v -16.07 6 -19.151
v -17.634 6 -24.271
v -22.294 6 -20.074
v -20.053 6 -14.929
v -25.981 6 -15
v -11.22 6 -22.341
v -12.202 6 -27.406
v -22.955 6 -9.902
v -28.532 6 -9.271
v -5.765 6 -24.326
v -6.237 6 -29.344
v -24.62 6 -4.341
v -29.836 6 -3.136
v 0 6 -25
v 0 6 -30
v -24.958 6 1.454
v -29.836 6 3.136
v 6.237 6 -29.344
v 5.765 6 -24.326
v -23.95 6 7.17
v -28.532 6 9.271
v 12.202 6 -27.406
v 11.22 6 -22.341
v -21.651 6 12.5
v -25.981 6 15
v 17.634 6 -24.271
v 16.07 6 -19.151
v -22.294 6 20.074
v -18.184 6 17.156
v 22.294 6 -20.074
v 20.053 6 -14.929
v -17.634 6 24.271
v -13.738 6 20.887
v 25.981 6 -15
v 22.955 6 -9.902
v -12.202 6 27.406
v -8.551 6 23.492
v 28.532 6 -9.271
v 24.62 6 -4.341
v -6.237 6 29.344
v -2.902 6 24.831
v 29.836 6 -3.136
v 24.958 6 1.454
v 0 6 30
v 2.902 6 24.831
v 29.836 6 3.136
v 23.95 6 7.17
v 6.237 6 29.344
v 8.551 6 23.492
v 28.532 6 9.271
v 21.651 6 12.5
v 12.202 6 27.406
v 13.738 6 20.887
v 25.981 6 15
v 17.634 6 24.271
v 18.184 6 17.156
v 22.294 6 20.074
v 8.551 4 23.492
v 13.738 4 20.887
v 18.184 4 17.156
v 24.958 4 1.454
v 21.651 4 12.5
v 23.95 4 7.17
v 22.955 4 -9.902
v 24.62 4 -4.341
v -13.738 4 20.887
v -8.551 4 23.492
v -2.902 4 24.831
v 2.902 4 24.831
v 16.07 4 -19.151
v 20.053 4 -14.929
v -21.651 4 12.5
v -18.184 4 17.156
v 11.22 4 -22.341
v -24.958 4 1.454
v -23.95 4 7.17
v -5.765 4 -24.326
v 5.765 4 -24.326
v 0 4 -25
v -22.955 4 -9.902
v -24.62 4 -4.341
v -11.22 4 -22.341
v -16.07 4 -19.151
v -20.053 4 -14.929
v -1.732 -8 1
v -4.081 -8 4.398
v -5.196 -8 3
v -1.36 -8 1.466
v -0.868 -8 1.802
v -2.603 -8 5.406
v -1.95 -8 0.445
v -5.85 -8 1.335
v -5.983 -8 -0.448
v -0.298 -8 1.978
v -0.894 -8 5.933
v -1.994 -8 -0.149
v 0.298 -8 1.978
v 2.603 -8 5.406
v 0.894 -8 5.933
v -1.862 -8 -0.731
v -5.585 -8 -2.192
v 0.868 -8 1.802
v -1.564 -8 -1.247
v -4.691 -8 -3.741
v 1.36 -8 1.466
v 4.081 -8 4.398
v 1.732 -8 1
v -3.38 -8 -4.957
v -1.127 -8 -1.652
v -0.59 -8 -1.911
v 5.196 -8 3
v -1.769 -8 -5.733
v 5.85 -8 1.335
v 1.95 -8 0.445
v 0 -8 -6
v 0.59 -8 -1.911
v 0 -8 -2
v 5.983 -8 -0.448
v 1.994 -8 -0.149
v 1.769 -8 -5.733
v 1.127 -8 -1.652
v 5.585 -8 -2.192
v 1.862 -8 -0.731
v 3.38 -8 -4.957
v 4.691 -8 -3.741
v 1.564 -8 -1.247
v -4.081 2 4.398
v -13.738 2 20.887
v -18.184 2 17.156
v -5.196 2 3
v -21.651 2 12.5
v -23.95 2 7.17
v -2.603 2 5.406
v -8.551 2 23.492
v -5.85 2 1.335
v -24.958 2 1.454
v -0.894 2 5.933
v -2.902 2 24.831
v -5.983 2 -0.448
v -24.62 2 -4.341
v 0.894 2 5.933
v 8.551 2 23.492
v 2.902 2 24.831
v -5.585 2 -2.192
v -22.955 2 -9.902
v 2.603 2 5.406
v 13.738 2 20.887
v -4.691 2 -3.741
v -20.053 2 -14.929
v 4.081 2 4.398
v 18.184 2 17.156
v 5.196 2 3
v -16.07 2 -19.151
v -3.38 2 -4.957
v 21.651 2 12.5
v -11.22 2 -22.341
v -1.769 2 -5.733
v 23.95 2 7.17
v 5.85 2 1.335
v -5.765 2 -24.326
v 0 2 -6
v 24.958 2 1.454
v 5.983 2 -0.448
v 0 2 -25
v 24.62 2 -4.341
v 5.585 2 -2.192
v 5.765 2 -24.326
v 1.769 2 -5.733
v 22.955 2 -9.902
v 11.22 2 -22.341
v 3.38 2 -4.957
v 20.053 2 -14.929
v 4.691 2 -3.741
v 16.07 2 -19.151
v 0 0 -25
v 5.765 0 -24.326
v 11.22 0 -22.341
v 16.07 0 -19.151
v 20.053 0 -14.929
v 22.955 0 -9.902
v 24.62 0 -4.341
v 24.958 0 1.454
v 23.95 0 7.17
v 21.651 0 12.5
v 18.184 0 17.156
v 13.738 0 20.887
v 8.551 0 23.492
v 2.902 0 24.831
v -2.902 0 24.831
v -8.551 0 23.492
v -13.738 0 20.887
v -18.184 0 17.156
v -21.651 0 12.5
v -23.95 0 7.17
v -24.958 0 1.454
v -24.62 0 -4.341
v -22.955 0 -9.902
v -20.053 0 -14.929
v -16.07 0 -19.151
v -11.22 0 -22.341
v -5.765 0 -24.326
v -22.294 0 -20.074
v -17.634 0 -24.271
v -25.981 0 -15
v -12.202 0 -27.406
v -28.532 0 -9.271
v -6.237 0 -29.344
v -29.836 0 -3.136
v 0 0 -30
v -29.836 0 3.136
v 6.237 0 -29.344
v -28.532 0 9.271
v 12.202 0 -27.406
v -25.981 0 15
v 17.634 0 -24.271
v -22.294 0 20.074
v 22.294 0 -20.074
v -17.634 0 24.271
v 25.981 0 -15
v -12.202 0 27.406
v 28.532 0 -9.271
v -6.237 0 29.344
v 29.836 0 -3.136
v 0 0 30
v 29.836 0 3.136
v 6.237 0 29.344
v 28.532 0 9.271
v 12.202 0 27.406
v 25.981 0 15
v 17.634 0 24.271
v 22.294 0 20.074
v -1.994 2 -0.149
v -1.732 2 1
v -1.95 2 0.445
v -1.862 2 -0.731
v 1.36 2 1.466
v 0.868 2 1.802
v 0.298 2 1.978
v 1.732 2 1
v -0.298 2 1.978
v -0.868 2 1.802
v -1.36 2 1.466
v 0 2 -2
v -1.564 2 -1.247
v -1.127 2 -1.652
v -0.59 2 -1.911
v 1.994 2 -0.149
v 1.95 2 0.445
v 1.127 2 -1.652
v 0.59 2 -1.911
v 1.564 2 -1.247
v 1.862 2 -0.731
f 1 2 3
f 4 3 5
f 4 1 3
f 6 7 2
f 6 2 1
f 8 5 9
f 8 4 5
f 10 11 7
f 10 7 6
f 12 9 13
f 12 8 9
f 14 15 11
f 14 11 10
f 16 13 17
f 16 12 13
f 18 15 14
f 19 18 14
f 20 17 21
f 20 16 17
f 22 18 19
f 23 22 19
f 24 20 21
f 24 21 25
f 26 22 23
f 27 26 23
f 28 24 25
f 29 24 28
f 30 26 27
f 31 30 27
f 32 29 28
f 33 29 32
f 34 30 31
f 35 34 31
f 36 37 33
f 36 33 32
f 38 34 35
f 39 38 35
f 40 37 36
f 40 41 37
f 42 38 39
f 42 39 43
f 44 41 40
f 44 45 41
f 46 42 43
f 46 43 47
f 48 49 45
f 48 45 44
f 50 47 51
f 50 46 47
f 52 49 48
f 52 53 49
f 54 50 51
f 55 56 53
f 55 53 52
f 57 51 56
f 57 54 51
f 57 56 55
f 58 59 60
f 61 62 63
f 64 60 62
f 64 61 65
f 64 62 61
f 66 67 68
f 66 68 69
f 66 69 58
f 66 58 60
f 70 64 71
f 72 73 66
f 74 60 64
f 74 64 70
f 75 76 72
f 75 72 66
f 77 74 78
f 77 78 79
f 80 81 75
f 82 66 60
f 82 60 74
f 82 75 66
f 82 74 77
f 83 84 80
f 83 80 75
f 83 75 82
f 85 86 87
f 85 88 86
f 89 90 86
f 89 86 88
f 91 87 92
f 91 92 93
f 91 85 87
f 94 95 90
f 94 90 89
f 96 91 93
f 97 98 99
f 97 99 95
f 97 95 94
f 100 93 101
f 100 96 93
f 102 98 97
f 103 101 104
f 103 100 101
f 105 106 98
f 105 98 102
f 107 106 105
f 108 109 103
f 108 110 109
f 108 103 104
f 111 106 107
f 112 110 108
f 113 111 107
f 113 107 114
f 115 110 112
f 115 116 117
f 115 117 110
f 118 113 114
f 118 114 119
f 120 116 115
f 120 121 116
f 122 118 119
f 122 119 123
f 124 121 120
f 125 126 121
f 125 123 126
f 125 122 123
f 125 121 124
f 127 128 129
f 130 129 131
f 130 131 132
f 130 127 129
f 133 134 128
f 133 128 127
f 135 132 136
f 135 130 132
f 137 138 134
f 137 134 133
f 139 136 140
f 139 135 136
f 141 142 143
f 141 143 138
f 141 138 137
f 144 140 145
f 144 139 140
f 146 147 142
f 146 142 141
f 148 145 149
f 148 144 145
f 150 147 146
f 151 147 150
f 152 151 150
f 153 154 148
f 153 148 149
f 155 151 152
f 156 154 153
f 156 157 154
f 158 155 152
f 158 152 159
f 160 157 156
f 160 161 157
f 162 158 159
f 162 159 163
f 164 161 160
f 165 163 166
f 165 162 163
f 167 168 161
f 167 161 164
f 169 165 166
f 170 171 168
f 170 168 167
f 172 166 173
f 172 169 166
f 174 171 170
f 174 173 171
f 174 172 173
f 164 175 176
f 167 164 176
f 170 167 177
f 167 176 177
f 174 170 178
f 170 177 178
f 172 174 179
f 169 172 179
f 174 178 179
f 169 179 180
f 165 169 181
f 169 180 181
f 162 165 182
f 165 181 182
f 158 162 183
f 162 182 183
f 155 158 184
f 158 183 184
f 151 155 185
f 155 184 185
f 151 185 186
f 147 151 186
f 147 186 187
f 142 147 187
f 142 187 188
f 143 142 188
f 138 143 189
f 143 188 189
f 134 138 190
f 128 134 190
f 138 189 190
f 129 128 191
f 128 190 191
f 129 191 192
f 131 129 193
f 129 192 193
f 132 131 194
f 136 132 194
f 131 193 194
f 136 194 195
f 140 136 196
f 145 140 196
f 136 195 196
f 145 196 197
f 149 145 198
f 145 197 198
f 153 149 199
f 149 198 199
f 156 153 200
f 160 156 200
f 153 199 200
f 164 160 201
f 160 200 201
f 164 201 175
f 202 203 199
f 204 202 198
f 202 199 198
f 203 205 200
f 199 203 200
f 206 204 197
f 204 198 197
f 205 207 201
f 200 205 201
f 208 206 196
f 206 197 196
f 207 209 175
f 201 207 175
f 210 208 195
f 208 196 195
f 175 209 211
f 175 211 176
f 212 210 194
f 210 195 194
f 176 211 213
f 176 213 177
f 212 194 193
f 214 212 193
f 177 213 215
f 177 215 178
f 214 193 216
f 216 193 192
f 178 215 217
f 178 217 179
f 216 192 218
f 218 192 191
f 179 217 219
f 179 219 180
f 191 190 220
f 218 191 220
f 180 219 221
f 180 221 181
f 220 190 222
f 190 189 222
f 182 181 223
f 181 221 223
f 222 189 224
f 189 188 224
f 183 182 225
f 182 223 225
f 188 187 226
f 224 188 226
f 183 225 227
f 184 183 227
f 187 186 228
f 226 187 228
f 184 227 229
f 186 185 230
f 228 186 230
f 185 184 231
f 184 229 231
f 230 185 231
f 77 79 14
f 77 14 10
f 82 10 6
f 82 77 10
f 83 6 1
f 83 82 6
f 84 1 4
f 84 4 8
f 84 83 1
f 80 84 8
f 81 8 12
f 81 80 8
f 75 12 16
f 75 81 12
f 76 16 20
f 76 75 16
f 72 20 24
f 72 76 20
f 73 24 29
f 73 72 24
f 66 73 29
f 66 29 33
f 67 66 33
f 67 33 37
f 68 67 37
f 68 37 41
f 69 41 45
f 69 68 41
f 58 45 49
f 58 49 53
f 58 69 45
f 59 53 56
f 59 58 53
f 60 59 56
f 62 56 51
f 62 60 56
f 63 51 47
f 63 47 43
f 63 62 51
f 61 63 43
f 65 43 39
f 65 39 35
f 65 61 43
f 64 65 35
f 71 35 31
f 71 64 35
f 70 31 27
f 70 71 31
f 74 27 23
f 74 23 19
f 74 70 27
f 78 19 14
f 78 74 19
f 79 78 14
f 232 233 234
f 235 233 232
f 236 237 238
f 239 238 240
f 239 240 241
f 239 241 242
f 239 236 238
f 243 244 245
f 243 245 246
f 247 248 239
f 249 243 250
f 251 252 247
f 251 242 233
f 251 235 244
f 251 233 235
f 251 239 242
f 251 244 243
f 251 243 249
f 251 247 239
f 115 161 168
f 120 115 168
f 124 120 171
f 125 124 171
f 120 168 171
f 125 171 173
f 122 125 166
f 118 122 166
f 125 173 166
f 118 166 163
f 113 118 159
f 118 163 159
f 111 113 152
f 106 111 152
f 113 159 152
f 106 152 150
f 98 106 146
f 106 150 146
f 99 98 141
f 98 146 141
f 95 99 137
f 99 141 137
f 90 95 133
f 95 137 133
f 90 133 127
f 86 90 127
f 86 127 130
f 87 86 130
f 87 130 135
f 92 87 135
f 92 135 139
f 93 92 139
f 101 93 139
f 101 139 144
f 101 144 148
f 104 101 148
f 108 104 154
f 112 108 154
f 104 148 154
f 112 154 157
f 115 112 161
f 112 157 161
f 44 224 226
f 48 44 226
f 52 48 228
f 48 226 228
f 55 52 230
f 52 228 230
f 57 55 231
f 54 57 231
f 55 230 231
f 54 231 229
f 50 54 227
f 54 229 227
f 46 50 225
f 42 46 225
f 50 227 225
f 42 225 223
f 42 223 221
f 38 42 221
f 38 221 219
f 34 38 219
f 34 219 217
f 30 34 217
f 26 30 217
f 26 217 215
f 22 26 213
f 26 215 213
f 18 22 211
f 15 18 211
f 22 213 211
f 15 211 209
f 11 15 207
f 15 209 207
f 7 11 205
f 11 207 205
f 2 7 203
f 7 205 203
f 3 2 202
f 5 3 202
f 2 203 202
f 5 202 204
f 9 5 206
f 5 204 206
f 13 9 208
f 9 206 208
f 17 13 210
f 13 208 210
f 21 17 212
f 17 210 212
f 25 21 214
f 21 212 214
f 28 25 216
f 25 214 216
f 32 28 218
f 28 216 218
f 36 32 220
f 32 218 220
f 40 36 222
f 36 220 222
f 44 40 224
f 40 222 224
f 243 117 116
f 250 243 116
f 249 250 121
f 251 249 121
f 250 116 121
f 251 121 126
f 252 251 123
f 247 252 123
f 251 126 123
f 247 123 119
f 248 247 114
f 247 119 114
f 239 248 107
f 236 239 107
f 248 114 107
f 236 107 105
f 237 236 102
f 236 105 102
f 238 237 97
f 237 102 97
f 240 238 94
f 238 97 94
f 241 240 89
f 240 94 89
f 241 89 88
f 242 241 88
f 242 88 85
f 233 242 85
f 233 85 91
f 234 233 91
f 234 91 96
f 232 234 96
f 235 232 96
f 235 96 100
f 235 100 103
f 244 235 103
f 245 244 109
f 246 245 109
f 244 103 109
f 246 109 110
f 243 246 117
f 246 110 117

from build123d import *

# Parameters (mm, degrees)
SKETCH_1_R          = 30
EXTRUDE_3_DEPTH     = 6
SKETCH_6_R          = 25
CUT_EXTRUDE_1_DEPTH = 2
CUT_EXTRUDE_START   = 4
SKETCH_4_R          = 25
CUT_EXTRUDE_2_DEPTH = 2
SKETCH_8_R          = 6
EXTRUDE_5_DEPTH     = 10
SKETCH_10_R         = 2
CUT_EXTRUDE_6_DEPTH = 10


with BuildPart() as part:
    # 草图1 → 凸台-拉伸3 (new body)
    with BuildSketch(Plane(origin=(0, 0, 0), x_dir=(1, 0, 0), z_dir=(0, 1, 0))):
        with Locations(Location((0, 0, 0), (0, 0, 270))):
            Circle(SKETCH_1_R)
    extrude(amount=EXTRUDE_3_DEPTH)

    # 草图6 → 切除-拉伸1 (cut)
    with BuildSketch(Plane.XZ):
        with Locations(Location((0, 0, 0), (0, 0, 270))):
            Circle(SKETCH_6_R)
    extrude(amount=-CUT_EXTRUDE_1_DEPTH, mode=Mode.SUBTRACT)

    # 草图4 → 切除-拉伸2 (cut)
    with BuildSketch(Plane(origin=(0, 0, 0), x_dir=(1, 0, 0), z_dir=(0, 1, 0)).offset(CUT_EXTRUDE_START)):
        with Locations(Location((0, 0, 0), (0, 0, 90))):
            Circle(SKETCH_4_R)
    extrude(amount=CUT_EXTRUDE_2_DEPTH, mode=Mode.SUBTRACT)

    # 草图8 → 凸台-拉伸5 (add)
    with BuildSketch(Plane(origin=(0, 2, 0), x_dir=(-1, 0, 0), z_dir=(0, -1, 0))):
        with Locations(Location((0, 0, 0), (0, 0, 90))):
            Circle(SKETCH_8_R)
    extrude(amount=EXTRUDE_5_DEPTH)

    # 草图10 → 切除-拉伸6 (cut)
    with BuildSketch(Plane(origin=(0, -8, 0), x_dir=(-1, 0, 0), z_dir=(0, -1, 0))):
        with Locations(Location((0, 0, 0), (0, 0, 90))):
            Circle(SKETCH_10_R)
    extrude(amount=-CUT_EXTRUDE_6_DEPTH, mode=Mode.SUBTRACT)


solid = part.part
